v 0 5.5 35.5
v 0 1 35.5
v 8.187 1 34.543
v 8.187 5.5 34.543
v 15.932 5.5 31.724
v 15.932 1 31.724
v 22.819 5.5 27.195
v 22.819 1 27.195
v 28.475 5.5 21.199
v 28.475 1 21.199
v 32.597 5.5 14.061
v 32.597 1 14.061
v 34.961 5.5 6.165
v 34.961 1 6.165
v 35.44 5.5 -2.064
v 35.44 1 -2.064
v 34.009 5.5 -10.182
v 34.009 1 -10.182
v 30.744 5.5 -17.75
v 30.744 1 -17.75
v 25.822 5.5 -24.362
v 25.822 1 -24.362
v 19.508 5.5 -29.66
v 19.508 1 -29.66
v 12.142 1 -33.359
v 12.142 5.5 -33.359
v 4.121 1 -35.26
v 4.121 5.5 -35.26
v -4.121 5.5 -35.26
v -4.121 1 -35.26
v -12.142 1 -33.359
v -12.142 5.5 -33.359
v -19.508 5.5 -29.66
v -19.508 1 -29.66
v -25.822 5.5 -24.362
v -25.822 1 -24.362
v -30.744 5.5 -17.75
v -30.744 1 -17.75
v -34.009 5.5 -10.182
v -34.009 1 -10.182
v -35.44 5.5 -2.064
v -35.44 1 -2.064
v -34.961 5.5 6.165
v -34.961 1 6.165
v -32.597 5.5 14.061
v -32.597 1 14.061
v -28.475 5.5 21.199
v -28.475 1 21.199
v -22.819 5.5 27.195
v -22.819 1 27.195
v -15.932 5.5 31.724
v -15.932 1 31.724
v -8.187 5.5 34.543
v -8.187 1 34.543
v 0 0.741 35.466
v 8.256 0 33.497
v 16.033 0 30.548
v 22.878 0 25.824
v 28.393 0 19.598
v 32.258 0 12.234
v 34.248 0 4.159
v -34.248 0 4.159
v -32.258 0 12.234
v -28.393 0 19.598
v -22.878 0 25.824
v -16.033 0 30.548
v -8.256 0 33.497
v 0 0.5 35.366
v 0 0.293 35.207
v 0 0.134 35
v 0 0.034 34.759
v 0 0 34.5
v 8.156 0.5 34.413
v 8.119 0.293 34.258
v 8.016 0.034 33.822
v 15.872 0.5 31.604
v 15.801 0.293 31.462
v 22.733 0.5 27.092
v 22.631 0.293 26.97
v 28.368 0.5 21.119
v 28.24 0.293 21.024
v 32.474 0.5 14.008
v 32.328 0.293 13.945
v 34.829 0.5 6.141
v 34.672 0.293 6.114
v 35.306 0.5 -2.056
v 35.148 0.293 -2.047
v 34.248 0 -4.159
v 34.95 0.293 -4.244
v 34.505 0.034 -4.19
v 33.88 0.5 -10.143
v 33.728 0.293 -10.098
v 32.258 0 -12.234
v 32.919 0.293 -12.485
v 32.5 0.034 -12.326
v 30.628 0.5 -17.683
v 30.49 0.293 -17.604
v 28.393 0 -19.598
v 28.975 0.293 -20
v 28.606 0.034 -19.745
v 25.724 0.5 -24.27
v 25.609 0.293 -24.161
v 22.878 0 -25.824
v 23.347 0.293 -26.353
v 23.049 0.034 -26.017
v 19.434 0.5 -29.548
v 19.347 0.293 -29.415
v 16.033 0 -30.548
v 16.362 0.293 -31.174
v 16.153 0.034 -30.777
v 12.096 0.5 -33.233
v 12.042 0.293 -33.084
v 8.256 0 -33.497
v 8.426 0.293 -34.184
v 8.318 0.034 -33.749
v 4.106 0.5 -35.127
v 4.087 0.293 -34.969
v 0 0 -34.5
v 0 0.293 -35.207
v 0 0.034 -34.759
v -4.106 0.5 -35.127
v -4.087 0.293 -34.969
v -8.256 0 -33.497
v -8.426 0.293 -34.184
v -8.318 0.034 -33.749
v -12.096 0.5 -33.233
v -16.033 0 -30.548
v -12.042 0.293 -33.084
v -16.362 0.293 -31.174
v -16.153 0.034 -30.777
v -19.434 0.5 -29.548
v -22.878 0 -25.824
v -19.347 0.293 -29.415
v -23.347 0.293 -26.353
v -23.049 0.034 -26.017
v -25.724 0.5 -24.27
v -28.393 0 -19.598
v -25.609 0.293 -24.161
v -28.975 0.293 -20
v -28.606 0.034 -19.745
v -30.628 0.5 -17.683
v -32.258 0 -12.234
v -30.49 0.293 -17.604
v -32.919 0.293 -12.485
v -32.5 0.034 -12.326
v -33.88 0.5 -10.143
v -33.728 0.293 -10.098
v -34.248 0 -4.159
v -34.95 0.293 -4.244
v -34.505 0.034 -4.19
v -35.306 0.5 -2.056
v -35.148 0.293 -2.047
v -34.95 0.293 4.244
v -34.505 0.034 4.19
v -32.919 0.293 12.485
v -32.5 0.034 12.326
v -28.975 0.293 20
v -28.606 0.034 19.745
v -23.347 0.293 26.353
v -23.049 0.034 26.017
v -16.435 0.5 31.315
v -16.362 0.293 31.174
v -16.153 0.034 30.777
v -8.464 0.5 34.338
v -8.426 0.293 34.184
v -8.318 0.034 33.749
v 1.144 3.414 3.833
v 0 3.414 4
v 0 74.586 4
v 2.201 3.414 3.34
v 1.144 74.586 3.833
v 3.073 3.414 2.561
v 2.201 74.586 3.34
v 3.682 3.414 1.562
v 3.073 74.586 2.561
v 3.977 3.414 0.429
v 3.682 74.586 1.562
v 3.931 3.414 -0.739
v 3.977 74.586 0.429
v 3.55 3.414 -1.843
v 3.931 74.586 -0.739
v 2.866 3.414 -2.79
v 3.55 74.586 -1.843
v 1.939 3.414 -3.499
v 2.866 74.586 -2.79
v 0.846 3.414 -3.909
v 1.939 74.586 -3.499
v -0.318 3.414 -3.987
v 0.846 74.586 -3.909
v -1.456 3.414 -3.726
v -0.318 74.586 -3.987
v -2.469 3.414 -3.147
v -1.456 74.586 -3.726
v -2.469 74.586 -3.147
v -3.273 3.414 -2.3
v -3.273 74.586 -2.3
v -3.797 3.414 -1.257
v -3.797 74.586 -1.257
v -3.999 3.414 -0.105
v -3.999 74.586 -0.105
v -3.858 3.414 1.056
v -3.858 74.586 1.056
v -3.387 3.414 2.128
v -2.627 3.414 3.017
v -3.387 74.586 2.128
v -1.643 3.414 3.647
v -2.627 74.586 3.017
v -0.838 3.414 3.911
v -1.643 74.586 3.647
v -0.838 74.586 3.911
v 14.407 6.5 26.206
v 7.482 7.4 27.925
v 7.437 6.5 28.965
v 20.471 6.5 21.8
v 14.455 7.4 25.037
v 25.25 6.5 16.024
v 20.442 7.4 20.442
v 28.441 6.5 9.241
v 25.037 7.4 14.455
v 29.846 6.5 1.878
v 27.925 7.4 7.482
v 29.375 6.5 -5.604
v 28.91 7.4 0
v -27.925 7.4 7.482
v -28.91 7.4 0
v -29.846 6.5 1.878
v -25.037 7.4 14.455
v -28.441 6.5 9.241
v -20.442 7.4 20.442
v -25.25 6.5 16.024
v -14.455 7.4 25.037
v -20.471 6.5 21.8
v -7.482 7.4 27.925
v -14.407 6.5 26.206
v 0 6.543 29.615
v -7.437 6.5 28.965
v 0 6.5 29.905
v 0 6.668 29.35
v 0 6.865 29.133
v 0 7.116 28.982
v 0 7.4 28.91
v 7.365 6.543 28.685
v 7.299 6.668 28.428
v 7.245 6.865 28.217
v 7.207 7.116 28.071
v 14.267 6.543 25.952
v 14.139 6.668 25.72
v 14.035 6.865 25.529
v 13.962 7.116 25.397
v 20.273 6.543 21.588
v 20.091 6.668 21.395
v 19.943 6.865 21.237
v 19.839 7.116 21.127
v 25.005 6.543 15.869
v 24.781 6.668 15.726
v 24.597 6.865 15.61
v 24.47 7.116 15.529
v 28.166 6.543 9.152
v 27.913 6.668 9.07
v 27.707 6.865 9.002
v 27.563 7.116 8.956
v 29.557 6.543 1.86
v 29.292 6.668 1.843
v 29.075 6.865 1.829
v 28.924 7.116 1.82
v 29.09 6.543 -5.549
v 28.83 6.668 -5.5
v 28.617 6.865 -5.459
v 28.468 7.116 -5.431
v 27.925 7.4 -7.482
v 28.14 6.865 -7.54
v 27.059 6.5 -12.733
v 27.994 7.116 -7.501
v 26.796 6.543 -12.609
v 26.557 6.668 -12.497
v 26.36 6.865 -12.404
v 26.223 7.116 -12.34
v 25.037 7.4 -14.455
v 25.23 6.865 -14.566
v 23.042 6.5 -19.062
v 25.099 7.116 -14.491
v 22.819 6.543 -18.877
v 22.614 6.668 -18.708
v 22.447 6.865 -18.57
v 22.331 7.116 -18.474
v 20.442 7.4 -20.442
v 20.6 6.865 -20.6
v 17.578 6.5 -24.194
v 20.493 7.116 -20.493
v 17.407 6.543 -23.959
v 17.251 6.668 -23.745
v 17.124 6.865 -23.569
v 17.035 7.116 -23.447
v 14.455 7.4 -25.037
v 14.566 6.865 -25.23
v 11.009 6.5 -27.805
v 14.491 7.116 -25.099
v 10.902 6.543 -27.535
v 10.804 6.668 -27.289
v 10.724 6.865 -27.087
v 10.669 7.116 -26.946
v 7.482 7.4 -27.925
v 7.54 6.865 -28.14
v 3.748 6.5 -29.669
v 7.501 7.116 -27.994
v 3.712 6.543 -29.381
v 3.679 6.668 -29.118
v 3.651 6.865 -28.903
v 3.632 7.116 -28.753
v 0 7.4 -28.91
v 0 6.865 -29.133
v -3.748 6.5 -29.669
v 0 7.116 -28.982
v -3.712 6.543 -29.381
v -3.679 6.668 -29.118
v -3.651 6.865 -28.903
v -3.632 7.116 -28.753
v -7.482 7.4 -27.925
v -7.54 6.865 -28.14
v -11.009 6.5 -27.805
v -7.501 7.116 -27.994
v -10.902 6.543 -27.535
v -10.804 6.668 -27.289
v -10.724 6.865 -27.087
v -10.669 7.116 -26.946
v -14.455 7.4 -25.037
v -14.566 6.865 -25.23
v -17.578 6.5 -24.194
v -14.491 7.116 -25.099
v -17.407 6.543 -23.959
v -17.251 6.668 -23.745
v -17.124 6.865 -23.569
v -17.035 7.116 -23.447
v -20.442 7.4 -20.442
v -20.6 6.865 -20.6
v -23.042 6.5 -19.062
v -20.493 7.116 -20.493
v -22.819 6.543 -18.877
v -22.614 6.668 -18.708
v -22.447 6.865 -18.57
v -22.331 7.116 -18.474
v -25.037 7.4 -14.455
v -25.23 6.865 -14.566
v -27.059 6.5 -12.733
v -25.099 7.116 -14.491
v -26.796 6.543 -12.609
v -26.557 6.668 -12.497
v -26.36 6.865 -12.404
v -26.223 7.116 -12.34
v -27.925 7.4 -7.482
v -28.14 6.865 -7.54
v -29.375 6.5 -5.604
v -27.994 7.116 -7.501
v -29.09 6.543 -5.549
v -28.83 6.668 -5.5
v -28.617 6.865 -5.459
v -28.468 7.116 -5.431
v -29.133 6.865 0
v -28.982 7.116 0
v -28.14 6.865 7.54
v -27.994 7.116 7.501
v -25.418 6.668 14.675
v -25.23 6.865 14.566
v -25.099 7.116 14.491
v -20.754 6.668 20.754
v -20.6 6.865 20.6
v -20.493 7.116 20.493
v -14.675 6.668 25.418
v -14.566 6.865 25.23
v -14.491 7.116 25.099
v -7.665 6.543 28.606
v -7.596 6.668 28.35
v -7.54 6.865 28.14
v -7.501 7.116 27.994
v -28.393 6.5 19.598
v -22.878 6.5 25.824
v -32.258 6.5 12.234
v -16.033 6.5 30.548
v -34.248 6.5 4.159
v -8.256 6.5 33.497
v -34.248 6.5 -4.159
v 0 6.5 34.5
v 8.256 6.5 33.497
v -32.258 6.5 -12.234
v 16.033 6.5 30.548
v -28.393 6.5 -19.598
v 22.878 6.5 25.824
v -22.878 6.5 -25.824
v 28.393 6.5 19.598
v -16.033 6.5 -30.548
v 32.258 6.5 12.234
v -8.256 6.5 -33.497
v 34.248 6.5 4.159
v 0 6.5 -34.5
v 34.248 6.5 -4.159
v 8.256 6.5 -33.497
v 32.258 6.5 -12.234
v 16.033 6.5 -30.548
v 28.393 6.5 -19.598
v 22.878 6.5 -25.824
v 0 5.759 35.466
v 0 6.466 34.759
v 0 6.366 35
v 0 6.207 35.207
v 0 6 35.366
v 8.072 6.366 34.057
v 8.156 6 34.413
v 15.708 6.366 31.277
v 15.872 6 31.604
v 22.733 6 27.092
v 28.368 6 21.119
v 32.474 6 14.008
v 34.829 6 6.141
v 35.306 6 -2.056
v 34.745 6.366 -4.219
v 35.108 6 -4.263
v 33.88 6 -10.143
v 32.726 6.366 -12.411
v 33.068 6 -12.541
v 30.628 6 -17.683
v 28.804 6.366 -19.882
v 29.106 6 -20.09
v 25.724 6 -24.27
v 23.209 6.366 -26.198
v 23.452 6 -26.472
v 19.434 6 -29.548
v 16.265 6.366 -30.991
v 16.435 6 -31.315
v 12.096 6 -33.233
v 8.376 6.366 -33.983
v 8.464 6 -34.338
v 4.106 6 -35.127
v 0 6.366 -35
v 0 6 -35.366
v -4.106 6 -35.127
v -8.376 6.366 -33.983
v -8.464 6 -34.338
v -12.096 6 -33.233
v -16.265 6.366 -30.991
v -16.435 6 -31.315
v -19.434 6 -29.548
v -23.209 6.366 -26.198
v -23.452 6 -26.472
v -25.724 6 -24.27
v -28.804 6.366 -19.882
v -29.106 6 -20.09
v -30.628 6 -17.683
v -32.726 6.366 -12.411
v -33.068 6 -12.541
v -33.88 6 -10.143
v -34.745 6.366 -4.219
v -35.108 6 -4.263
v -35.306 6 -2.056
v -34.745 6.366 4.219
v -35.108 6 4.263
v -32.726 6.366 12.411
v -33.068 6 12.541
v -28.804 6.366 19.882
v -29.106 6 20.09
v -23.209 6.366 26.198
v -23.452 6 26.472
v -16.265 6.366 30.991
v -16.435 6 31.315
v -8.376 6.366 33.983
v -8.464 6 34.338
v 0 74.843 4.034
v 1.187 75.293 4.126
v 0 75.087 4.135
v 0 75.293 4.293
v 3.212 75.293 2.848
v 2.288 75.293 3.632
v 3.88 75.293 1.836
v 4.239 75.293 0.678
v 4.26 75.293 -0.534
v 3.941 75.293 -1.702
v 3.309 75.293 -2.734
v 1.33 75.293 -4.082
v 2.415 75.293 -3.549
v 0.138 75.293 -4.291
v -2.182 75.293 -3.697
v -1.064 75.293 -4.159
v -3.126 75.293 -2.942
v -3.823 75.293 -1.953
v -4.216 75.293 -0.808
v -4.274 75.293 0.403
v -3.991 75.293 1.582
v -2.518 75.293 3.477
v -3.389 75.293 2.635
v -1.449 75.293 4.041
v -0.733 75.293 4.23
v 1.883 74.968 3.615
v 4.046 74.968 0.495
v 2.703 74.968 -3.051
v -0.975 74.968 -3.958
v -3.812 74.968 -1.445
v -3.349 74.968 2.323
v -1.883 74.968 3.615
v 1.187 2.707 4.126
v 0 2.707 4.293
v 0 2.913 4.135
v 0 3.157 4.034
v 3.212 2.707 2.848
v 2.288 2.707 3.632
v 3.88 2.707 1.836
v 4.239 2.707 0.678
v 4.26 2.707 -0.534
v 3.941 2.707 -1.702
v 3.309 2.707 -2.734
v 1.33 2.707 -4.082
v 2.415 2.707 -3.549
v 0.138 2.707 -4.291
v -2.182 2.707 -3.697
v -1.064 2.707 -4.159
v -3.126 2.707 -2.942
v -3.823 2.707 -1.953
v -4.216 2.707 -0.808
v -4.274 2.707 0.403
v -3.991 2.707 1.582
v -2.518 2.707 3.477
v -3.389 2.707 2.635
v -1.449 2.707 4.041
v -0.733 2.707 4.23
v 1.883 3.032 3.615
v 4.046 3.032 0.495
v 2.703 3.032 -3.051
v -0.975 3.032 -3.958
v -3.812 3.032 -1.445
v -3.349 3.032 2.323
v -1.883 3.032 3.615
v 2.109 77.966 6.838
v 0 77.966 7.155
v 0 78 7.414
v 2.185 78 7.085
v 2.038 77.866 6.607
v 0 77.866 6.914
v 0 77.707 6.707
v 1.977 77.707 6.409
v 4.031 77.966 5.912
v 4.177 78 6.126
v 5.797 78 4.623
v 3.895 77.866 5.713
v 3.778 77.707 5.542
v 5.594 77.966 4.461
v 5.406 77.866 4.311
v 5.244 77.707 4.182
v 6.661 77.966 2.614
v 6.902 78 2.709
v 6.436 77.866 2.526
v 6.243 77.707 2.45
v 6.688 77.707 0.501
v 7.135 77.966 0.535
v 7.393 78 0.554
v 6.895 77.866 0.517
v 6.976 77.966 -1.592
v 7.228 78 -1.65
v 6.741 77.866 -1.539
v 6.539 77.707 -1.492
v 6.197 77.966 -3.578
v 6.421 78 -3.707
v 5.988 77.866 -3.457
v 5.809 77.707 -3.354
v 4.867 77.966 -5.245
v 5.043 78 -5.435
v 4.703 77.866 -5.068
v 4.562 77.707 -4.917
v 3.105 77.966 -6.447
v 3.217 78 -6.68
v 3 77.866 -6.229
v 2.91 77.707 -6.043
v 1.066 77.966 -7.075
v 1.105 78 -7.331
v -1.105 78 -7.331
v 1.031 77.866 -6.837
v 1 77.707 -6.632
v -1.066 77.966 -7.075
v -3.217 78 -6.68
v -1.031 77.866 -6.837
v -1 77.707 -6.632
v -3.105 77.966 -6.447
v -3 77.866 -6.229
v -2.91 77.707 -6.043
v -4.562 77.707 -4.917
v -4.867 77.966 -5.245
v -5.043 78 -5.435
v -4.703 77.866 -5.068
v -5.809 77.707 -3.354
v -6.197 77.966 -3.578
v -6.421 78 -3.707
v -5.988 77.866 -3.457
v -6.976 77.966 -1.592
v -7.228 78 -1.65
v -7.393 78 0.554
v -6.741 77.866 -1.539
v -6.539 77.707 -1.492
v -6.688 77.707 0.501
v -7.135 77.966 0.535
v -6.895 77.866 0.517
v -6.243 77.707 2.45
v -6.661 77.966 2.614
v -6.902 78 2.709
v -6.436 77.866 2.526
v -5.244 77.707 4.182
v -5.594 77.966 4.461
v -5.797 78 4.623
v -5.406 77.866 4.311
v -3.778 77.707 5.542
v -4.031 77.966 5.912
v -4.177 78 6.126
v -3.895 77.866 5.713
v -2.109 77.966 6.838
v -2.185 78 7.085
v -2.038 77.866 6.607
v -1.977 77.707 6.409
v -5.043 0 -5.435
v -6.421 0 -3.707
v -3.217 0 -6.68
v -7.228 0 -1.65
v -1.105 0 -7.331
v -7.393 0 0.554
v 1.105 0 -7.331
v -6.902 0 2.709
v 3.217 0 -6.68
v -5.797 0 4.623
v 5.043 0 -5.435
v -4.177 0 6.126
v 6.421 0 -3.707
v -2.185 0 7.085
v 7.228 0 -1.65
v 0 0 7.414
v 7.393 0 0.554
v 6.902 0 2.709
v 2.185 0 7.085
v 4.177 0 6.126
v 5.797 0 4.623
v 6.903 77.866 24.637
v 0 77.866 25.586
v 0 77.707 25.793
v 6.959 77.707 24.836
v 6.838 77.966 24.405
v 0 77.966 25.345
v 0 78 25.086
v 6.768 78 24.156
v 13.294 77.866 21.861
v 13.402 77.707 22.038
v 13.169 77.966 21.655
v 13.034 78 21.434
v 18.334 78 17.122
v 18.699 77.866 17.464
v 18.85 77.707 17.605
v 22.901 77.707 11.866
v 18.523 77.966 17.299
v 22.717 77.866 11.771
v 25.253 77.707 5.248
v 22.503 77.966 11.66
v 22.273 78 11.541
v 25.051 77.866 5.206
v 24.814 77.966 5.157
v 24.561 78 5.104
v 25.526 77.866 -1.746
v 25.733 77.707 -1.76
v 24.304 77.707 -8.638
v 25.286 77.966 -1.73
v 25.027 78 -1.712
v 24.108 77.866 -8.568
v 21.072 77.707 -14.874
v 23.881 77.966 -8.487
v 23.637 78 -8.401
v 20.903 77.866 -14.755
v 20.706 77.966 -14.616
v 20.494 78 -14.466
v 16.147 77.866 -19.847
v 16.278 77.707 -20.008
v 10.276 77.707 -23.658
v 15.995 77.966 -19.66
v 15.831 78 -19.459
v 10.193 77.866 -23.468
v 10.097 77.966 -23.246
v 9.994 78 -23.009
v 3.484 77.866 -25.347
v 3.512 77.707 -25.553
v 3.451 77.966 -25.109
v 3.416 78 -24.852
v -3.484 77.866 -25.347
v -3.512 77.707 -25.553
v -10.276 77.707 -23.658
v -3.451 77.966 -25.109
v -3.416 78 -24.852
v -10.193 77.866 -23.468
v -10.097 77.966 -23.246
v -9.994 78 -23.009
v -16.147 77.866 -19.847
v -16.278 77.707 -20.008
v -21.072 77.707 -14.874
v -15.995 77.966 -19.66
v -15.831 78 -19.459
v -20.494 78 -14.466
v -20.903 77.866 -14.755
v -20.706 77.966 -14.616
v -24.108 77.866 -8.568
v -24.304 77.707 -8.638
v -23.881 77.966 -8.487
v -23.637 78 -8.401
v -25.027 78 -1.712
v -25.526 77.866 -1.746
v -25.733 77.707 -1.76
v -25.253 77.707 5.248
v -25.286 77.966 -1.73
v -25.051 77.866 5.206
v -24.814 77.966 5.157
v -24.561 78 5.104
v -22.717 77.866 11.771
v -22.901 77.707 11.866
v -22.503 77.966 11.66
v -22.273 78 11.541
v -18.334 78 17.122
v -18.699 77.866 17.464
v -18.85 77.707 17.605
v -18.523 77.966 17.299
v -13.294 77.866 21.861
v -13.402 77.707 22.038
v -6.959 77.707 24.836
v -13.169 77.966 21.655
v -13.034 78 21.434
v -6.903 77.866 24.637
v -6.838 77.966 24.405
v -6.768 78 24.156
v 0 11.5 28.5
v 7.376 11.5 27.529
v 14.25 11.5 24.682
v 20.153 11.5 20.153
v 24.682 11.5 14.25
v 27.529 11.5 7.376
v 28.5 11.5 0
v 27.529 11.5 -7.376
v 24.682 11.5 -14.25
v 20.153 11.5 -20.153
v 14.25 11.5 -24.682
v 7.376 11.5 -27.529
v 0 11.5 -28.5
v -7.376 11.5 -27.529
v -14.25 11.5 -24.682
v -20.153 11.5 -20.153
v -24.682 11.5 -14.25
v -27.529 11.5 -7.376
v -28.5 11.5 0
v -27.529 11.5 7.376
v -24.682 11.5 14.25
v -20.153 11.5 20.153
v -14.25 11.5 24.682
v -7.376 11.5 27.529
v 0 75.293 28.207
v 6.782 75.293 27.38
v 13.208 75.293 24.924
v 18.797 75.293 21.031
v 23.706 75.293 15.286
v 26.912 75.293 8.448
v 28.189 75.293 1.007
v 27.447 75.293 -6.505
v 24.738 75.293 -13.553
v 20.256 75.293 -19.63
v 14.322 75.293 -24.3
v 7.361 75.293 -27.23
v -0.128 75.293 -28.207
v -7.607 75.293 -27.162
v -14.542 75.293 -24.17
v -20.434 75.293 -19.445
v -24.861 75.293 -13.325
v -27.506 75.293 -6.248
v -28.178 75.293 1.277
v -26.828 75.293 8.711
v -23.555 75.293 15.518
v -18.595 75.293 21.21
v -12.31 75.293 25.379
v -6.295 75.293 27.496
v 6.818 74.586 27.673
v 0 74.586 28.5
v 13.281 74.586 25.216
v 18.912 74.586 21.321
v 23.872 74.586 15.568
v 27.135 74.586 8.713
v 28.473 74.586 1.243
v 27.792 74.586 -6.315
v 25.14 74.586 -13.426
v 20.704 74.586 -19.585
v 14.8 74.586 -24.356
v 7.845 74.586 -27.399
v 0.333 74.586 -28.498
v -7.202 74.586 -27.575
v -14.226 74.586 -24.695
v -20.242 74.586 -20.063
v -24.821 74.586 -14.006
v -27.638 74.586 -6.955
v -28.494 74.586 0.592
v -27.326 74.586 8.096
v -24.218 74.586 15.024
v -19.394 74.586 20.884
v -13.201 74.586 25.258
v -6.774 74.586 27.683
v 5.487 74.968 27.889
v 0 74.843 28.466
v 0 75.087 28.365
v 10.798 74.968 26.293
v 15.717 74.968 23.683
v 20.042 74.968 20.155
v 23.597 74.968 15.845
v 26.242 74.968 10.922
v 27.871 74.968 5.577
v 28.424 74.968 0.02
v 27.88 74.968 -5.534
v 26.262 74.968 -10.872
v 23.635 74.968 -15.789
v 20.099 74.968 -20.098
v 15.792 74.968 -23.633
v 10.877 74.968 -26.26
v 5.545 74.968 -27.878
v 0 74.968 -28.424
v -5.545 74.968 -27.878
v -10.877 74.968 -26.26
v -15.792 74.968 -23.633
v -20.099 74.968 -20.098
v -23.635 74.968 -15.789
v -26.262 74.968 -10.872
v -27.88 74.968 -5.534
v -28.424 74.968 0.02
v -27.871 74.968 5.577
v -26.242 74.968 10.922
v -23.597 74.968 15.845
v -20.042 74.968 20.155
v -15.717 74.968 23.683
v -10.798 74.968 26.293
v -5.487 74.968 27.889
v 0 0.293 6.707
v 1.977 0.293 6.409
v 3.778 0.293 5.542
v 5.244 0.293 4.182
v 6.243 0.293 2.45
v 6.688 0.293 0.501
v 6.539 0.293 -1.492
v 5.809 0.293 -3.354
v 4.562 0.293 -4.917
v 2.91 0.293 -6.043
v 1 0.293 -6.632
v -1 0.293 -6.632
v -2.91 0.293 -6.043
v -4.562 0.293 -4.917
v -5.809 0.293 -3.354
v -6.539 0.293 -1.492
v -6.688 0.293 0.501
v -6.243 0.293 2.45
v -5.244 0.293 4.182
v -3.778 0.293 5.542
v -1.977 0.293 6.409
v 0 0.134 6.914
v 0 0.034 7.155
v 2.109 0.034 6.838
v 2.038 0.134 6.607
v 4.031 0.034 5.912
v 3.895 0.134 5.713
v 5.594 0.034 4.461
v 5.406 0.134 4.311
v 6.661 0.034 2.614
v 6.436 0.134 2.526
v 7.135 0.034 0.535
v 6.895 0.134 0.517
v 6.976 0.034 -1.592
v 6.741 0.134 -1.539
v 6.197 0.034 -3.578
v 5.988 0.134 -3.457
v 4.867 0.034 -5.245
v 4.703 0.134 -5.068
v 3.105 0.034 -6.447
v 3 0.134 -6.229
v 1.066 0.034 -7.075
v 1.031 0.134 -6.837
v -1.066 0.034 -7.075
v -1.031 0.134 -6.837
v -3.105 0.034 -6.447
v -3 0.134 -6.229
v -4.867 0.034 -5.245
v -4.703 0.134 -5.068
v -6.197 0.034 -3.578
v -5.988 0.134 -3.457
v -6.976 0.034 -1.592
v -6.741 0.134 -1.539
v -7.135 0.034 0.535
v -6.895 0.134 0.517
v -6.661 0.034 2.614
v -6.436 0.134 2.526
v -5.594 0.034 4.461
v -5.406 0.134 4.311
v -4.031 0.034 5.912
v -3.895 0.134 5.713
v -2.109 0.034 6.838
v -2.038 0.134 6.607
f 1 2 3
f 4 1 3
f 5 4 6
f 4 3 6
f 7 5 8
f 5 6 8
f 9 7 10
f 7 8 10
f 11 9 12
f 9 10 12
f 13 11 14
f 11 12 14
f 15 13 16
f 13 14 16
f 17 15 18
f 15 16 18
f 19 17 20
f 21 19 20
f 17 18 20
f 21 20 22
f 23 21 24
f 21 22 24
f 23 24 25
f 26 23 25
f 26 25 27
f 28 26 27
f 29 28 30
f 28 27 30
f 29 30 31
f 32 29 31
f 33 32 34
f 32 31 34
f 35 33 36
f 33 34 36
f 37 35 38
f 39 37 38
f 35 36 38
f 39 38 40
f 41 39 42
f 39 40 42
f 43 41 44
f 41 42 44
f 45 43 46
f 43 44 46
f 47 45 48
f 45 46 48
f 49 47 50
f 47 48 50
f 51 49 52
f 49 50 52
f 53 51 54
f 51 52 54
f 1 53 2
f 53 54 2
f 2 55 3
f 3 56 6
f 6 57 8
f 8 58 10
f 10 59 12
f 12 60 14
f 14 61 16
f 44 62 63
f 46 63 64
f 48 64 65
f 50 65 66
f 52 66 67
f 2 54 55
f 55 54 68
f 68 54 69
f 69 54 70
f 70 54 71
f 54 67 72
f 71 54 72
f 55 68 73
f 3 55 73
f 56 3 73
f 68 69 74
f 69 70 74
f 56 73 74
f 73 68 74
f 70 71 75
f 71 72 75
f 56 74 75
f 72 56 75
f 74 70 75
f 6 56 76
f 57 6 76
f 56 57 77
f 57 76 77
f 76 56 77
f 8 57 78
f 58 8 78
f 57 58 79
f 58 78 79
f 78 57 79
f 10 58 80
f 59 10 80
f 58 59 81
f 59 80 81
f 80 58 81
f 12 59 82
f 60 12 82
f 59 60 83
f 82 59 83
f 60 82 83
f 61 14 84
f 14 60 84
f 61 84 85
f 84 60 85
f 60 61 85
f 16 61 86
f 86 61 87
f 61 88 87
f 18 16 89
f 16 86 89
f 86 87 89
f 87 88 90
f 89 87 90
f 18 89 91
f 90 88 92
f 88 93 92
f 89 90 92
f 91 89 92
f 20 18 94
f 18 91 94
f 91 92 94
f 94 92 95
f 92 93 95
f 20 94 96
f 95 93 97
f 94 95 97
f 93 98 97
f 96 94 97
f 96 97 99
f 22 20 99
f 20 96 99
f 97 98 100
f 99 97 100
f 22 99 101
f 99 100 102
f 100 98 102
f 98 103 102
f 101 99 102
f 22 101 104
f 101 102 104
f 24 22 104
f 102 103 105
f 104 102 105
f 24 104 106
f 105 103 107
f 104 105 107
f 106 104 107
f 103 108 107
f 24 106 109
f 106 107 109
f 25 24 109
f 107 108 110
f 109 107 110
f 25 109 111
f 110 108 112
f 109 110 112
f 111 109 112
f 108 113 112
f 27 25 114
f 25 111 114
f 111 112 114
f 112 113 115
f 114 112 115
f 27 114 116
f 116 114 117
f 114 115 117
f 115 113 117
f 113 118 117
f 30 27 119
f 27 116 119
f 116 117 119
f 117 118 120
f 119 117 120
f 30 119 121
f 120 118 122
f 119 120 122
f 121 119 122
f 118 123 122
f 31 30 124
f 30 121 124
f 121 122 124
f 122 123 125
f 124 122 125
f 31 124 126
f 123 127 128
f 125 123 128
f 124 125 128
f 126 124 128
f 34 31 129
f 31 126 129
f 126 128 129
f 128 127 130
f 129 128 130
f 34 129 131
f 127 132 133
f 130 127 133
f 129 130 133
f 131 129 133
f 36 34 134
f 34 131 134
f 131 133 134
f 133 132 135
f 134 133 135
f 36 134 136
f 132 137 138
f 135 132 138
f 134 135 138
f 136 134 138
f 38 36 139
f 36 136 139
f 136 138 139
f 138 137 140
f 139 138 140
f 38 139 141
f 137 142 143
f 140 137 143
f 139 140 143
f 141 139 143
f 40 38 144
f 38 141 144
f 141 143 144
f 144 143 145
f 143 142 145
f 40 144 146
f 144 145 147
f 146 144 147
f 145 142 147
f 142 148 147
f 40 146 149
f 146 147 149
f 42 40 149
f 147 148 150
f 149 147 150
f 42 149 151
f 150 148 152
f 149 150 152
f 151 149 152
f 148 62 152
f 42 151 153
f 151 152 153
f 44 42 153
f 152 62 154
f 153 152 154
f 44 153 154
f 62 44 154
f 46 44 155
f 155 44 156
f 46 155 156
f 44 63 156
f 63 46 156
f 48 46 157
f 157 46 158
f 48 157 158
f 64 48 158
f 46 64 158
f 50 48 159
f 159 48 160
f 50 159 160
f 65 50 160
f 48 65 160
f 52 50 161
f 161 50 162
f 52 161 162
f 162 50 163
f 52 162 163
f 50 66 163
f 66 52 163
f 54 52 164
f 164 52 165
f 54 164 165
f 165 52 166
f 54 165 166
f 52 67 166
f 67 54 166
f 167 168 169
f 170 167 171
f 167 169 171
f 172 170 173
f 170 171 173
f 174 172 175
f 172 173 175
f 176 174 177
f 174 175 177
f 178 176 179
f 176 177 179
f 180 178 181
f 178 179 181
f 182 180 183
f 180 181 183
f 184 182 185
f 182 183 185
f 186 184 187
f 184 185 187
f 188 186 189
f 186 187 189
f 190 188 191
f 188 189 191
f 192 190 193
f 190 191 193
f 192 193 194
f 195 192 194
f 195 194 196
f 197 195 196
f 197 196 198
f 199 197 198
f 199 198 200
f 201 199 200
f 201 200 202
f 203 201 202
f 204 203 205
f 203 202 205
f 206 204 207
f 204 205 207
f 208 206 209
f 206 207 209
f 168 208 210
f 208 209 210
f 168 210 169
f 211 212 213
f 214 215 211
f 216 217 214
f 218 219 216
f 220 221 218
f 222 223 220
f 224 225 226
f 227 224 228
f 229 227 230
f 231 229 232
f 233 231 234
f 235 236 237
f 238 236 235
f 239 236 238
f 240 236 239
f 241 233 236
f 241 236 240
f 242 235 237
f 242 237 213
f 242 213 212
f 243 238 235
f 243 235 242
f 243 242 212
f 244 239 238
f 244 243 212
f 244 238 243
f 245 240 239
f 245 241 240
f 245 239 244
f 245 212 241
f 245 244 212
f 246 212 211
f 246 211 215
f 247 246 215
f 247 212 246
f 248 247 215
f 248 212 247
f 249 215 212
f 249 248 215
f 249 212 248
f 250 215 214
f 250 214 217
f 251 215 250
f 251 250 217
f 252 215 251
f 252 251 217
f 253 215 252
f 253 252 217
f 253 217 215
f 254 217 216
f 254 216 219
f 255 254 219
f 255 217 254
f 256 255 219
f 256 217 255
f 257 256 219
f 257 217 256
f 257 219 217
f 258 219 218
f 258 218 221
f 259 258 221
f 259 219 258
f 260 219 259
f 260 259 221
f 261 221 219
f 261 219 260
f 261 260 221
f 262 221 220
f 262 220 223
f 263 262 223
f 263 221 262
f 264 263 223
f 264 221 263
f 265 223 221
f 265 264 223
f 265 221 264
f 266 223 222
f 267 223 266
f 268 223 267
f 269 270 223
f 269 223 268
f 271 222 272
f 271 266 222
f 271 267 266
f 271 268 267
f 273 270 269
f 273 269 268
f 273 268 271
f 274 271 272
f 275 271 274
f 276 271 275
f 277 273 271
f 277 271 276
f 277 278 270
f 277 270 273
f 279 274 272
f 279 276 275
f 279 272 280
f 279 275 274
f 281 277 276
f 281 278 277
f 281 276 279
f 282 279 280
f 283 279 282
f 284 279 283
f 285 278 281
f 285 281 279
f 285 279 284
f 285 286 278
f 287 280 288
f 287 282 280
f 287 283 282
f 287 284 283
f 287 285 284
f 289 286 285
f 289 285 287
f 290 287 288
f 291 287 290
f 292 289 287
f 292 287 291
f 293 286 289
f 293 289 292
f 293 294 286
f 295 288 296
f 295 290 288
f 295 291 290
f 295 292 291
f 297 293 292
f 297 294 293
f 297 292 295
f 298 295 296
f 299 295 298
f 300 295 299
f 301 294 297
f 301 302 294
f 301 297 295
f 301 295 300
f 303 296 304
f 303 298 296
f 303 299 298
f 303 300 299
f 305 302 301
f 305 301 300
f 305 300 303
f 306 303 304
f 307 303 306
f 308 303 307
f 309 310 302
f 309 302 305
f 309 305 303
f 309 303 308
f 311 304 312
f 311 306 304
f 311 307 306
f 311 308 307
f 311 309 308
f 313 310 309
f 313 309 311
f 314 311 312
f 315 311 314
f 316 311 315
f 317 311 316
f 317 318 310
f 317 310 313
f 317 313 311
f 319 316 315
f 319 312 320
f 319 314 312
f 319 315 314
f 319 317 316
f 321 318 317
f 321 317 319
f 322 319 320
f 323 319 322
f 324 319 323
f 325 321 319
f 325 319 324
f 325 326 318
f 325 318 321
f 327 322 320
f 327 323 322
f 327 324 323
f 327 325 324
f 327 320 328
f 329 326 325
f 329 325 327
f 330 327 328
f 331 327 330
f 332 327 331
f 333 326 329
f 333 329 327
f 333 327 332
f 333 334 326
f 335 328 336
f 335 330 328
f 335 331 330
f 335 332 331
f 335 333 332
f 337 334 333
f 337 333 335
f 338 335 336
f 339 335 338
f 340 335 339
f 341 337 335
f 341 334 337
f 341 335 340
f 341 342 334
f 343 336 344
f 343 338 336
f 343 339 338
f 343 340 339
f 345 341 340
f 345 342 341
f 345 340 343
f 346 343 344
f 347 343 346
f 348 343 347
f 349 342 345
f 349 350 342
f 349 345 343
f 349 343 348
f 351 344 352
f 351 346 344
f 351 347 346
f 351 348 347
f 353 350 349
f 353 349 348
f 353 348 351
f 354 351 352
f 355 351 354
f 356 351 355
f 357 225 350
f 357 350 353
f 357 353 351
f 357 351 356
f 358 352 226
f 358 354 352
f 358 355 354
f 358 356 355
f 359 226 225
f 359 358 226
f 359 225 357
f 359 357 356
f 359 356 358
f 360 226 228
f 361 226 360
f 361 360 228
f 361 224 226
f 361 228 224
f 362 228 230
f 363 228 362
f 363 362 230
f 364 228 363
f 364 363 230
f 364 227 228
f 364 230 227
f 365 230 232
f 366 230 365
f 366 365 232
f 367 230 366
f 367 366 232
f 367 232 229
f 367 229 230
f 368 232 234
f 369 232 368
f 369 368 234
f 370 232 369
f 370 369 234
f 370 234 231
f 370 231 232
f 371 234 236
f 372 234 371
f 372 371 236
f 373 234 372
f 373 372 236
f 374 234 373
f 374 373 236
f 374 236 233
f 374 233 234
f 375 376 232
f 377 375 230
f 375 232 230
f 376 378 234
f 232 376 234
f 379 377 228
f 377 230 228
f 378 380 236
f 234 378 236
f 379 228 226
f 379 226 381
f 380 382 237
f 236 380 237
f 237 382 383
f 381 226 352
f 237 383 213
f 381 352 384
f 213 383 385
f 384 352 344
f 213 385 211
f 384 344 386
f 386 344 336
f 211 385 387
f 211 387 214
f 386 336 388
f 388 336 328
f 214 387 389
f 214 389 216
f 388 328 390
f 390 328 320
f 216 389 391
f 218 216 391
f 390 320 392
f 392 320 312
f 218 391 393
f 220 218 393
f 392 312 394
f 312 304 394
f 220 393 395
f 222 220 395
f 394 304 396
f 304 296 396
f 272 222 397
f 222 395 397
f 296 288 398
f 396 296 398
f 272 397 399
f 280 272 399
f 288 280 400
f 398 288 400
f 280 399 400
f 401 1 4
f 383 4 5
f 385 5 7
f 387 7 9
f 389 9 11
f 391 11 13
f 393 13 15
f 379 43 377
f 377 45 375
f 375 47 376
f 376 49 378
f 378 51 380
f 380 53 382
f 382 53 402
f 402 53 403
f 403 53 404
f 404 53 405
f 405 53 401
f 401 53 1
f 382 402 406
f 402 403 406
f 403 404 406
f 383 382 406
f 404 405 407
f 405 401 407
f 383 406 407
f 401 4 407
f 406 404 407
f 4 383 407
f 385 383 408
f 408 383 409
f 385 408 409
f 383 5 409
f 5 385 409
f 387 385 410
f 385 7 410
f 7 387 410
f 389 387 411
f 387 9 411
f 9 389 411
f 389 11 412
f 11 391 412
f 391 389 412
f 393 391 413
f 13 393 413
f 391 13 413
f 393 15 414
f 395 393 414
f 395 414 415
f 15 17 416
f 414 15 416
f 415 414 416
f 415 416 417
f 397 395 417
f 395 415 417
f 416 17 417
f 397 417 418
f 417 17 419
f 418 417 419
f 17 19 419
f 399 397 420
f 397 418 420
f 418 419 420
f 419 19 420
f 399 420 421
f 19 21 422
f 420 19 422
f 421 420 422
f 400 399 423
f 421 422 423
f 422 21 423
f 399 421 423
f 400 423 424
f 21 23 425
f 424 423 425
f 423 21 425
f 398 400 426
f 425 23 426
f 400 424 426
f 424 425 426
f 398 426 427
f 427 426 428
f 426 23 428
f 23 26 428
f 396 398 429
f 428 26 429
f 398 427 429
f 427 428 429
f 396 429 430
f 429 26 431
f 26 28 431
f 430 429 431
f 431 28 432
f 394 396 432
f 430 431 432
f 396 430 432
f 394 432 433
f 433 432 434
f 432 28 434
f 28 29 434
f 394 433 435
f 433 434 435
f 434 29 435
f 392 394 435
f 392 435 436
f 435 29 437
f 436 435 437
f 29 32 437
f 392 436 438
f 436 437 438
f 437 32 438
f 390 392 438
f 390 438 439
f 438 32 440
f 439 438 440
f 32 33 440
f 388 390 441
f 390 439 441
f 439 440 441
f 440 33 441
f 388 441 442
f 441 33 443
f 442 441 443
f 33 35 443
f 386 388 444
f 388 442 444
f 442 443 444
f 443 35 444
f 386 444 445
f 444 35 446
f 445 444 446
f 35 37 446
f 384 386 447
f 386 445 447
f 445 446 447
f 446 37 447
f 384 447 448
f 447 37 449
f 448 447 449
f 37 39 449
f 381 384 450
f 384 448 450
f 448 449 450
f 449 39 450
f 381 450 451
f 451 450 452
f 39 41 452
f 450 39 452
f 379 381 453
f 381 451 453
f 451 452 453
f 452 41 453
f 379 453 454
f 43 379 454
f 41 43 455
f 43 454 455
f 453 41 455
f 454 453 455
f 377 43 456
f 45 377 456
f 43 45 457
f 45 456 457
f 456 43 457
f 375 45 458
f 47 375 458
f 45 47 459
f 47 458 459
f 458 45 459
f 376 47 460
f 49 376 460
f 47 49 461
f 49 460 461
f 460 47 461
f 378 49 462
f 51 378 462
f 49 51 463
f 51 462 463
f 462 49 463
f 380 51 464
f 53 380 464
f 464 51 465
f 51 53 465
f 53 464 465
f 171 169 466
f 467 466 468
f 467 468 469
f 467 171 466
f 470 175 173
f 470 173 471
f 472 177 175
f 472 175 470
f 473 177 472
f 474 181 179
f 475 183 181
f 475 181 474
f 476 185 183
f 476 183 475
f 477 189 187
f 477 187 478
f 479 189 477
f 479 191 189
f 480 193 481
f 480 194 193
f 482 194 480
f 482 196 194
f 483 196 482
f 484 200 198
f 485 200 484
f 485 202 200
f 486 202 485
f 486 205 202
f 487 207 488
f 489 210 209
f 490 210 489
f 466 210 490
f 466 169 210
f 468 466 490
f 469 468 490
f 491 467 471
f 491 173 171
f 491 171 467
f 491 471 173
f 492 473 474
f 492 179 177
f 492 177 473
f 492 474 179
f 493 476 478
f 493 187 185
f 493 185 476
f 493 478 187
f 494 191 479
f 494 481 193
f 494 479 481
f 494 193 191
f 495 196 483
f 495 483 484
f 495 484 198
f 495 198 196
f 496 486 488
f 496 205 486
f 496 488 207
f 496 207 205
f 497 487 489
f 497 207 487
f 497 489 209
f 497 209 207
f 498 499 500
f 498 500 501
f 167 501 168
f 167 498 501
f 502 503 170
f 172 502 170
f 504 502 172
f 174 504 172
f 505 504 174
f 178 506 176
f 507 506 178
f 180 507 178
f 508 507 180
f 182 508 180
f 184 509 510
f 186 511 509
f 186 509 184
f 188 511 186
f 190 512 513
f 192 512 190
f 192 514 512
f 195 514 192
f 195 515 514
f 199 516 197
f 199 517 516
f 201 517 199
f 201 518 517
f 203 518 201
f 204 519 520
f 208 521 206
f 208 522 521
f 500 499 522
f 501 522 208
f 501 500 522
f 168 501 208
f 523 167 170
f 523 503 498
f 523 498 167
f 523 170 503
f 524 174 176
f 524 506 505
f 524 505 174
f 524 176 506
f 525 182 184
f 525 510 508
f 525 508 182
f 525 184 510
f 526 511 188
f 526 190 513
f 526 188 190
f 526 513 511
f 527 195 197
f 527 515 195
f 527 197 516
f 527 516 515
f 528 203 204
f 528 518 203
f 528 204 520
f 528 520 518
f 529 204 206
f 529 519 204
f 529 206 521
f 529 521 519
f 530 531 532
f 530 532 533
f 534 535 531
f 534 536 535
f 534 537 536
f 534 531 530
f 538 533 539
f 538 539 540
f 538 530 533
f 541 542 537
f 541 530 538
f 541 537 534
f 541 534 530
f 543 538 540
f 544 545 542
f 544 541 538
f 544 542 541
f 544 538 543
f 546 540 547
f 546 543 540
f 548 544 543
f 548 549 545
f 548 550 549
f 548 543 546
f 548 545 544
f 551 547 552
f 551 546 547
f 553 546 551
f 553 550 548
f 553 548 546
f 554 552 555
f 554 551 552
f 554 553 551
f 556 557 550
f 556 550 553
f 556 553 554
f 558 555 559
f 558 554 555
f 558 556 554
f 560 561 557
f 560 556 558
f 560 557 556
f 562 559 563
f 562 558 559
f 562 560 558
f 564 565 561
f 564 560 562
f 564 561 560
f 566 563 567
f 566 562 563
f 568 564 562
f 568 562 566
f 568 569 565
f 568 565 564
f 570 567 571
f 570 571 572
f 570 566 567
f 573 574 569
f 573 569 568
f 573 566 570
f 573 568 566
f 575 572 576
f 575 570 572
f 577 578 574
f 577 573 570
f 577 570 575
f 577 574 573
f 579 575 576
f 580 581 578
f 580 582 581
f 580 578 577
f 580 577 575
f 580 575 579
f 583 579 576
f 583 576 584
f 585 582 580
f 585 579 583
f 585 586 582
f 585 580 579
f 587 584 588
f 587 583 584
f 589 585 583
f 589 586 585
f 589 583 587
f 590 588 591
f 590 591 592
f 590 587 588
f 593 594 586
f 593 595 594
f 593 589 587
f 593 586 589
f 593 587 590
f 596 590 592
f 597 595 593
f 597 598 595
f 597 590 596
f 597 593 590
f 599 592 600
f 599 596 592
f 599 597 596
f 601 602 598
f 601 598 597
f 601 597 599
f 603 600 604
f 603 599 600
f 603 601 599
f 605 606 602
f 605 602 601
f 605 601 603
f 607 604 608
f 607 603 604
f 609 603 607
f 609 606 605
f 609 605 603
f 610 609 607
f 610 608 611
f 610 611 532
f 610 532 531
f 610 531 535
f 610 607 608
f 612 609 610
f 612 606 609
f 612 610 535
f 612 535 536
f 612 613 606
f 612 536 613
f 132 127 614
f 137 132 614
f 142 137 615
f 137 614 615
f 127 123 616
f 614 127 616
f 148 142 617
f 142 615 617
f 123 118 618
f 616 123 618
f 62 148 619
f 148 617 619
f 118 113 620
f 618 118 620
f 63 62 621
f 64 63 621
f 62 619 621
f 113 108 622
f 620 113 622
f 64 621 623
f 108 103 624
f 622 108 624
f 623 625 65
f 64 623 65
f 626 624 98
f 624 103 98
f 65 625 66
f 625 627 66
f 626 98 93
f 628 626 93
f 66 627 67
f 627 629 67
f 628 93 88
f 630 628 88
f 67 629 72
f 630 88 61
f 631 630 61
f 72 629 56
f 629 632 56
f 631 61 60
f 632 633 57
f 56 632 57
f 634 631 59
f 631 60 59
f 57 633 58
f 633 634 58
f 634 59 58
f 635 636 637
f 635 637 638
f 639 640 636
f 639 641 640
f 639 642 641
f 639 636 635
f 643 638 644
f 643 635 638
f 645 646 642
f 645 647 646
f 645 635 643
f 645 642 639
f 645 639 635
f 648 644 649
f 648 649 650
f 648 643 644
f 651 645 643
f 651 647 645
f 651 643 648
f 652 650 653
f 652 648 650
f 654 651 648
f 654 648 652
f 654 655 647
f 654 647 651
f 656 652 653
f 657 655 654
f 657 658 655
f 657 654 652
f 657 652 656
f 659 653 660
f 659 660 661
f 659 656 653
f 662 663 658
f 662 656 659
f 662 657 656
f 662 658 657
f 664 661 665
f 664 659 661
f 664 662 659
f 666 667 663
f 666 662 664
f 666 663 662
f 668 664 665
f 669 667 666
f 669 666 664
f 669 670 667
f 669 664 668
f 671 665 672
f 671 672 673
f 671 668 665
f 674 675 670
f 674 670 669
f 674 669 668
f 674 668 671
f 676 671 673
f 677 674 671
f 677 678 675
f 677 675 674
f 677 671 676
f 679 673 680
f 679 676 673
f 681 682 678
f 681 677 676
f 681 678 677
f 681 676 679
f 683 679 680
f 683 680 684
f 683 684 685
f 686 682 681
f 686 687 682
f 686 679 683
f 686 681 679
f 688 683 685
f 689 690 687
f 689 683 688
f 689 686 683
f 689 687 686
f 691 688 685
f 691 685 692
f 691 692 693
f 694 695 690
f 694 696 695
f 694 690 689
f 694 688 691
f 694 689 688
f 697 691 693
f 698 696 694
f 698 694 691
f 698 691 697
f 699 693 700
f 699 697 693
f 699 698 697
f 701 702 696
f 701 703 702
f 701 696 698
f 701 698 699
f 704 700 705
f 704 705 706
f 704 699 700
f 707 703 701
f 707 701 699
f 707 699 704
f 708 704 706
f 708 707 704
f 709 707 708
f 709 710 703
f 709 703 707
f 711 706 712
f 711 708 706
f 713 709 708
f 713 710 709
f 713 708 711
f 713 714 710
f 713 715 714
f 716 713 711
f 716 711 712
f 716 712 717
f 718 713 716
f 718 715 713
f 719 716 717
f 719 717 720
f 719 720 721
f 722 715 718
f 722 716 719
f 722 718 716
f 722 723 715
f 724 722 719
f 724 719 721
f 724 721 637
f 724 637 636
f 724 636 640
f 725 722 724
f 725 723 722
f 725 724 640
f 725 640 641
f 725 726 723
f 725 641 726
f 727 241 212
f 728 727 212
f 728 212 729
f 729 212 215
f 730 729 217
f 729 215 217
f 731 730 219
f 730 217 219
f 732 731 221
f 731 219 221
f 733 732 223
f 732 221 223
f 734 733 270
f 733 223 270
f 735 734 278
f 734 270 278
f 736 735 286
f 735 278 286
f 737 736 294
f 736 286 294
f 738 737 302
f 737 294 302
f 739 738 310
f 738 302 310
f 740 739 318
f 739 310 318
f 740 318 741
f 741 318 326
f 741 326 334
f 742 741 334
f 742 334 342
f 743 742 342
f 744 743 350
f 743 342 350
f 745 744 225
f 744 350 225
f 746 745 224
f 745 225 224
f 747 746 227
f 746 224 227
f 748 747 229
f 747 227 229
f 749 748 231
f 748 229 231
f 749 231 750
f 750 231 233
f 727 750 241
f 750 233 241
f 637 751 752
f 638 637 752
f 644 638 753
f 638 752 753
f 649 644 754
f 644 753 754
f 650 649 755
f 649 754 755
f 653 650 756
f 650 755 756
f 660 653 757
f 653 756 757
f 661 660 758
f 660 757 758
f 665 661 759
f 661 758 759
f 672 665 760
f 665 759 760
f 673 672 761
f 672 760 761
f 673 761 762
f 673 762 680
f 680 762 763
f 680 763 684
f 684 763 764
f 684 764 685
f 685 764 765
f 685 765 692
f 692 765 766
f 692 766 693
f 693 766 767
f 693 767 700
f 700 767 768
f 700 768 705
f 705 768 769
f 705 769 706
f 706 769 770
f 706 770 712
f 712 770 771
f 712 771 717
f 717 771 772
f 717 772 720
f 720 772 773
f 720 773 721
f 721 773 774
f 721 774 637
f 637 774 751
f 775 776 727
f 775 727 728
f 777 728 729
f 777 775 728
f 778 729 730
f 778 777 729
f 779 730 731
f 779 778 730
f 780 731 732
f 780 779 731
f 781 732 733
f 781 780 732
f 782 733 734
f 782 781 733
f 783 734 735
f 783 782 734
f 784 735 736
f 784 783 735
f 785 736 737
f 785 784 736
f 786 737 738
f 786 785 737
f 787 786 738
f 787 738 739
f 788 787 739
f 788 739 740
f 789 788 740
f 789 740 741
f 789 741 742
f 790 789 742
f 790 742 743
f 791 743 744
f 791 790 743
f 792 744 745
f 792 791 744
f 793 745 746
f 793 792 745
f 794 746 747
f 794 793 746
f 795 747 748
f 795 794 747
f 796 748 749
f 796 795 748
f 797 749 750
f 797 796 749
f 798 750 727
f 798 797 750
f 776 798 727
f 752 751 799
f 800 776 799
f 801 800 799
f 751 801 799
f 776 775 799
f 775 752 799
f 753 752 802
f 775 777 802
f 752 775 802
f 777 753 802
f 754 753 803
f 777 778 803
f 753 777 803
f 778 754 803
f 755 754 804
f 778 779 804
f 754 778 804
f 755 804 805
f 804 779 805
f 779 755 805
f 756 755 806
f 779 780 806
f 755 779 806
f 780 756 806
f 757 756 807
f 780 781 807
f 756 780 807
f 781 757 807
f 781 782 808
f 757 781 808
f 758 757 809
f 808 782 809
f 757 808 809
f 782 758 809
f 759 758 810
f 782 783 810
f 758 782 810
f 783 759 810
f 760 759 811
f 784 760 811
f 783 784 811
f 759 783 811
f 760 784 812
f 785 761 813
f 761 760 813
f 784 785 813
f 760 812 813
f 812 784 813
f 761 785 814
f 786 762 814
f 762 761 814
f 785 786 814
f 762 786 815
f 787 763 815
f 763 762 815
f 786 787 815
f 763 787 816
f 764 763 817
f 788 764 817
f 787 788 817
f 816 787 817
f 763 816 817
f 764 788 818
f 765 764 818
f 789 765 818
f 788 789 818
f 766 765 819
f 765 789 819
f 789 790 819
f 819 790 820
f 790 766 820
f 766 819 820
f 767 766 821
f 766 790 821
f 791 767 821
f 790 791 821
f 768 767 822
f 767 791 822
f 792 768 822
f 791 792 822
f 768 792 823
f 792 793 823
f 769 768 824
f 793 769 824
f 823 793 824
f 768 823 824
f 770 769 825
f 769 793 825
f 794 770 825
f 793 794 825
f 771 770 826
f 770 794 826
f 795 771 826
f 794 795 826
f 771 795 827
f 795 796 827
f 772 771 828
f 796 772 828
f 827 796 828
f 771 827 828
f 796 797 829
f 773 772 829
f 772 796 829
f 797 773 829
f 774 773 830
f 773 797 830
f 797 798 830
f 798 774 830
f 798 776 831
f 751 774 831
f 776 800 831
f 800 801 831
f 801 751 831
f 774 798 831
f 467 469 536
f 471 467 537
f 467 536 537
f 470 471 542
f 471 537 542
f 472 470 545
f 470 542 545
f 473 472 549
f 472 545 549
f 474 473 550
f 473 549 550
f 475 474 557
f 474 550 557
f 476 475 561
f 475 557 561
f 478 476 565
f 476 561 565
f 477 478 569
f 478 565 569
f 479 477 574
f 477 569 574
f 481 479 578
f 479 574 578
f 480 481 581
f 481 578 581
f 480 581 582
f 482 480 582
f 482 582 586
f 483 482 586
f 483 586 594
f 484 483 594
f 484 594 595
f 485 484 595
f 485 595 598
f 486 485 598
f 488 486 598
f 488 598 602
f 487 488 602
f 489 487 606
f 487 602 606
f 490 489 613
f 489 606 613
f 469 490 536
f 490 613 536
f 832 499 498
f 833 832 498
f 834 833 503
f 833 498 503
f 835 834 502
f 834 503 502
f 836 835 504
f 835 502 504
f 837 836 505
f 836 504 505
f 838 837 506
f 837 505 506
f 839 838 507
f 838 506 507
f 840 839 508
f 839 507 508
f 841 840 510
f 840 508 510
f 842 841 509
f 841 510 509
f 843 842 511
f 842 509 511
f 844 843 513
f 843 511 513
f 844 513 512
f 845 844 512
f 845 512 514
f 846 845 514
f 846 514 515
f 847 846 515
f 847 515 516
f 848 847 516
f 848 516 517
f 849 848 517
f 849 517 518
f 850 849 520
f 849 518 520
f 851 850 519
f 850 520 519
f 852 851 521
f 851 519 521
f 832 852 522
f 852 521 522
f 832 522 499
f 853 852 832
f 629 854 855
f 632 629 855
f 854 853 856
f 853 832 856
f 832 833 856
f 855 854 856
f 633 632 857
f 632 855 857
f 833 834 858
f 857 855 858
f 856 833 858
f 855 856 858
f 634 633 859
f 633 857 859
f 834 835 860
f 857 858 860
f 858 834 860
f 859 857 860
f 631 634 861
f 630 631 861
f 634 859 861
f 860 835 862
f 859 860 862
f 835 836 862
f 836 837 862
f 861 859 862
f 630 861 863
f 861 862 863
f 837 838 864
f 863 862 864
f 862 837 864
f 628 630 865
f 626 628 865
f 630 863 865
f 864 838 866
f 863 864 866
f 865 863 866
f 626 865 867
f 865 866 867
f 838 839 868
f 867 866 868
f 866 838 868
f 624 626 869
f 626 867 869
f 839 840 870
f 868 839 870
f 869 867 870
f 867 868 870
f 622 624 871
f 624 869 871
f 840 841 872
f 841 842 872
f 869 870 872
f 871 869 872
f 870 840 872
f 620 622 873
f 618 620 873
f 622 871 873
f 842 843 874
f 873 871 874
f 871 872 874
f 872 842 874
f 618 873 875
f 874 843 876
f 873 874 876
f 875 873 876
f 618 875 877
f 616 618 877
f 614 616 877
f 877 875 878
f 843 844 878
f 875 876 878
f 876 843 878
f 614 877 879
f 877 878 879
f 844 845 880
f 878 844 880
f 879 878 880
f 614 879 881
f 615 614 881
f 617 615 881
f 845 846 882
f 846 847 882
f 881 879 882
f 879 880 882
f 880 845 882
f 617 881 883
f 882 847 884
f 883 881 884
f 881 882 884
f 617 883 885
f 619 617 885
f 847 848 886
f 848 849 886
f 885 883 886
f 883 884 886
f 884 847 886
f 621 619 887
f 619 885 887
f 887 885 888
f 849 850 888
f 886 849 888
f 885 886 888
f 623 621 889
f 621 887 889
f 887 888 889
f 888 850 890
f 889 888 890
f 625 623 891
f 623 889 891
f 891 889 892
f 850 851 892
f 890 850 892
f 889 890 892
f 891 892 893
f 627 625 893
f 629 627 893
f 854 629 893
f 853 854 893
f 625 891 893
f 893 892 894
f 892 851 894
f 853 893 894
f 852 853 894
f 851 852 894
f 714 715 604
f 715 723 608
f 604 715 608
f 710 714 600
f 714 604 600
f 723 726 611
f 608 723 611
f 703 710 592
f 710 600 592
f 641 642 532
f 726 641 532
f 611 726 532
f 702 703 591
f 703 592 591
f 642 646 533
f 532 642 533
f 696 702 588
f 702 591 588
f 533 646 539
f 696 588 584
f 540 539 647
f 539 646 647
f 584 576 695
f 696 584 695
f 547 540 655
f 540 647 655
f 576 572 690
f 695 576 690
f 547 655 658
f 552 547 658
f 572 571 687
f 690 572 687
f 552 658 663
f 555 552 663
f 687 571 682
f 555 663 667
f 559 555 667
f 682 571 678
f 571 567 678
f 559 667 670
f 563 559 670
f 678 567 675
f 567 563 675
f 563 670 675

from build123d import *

# Parameters (mm, degrees)
F0_W     = 71.5
F0_H     = 24.5
F2_SIZE  = 3
F3_SIZE2 = 0.5
F3_SIZE  = 5
F4_R     = 1


with BuildPart() as f1:
    # F0 (on Right) → F1 (revolve)
    with BuildSketch(Plane.YZ):
        Polygon((0, 35.5), (0, 4), (6.5, 4), (6.5, 28.5), (6.5, 35.5), align=None)
        with Locations((42.25, 16.25)):
            Rectangle(F0_W, F0_H)
    revolve(axis=Axis((0, 38.0806664313, 0), (0, 1, 0)))

    # F2
    f2_edges = [f1.edges().sort_by_distance(p)[0] for p in [
        (0, 78, -28.5),
        (0, 78, -4),
        (0, 0, -4),
    ]]
    chamfer(f2_edges, length=F2_SIZE)

    # F3
    f3_edges = [f1.edges().sort_by_distance(p)[0] for p in [
        (0, 6.5, -28.5),
    ]]
    f3_side = f1.faces().sort_by_distance((0, 40.75, -28.5))[0]
    chamfer(f3_edges, length=F3_SIZE, length2=F3_SIZE2, reference=f3_side)

    # F4
    f4_edges = [f1.edges().sort_by_distance(p)[0] for p in [
        (0, 0, -35.5),
        (0, 6.5, -35.5),
        (0, 6.5, -29),
        (0, 75, -28.5),
        (0, 78, -25.5),
        (0, 75, -4),
        (0, 78, -7),
        (0, 0, -7),
        (0, 3, -4),
    ]]
    fillet(f4_edges, radius=F4_R)


solid = f1.part
